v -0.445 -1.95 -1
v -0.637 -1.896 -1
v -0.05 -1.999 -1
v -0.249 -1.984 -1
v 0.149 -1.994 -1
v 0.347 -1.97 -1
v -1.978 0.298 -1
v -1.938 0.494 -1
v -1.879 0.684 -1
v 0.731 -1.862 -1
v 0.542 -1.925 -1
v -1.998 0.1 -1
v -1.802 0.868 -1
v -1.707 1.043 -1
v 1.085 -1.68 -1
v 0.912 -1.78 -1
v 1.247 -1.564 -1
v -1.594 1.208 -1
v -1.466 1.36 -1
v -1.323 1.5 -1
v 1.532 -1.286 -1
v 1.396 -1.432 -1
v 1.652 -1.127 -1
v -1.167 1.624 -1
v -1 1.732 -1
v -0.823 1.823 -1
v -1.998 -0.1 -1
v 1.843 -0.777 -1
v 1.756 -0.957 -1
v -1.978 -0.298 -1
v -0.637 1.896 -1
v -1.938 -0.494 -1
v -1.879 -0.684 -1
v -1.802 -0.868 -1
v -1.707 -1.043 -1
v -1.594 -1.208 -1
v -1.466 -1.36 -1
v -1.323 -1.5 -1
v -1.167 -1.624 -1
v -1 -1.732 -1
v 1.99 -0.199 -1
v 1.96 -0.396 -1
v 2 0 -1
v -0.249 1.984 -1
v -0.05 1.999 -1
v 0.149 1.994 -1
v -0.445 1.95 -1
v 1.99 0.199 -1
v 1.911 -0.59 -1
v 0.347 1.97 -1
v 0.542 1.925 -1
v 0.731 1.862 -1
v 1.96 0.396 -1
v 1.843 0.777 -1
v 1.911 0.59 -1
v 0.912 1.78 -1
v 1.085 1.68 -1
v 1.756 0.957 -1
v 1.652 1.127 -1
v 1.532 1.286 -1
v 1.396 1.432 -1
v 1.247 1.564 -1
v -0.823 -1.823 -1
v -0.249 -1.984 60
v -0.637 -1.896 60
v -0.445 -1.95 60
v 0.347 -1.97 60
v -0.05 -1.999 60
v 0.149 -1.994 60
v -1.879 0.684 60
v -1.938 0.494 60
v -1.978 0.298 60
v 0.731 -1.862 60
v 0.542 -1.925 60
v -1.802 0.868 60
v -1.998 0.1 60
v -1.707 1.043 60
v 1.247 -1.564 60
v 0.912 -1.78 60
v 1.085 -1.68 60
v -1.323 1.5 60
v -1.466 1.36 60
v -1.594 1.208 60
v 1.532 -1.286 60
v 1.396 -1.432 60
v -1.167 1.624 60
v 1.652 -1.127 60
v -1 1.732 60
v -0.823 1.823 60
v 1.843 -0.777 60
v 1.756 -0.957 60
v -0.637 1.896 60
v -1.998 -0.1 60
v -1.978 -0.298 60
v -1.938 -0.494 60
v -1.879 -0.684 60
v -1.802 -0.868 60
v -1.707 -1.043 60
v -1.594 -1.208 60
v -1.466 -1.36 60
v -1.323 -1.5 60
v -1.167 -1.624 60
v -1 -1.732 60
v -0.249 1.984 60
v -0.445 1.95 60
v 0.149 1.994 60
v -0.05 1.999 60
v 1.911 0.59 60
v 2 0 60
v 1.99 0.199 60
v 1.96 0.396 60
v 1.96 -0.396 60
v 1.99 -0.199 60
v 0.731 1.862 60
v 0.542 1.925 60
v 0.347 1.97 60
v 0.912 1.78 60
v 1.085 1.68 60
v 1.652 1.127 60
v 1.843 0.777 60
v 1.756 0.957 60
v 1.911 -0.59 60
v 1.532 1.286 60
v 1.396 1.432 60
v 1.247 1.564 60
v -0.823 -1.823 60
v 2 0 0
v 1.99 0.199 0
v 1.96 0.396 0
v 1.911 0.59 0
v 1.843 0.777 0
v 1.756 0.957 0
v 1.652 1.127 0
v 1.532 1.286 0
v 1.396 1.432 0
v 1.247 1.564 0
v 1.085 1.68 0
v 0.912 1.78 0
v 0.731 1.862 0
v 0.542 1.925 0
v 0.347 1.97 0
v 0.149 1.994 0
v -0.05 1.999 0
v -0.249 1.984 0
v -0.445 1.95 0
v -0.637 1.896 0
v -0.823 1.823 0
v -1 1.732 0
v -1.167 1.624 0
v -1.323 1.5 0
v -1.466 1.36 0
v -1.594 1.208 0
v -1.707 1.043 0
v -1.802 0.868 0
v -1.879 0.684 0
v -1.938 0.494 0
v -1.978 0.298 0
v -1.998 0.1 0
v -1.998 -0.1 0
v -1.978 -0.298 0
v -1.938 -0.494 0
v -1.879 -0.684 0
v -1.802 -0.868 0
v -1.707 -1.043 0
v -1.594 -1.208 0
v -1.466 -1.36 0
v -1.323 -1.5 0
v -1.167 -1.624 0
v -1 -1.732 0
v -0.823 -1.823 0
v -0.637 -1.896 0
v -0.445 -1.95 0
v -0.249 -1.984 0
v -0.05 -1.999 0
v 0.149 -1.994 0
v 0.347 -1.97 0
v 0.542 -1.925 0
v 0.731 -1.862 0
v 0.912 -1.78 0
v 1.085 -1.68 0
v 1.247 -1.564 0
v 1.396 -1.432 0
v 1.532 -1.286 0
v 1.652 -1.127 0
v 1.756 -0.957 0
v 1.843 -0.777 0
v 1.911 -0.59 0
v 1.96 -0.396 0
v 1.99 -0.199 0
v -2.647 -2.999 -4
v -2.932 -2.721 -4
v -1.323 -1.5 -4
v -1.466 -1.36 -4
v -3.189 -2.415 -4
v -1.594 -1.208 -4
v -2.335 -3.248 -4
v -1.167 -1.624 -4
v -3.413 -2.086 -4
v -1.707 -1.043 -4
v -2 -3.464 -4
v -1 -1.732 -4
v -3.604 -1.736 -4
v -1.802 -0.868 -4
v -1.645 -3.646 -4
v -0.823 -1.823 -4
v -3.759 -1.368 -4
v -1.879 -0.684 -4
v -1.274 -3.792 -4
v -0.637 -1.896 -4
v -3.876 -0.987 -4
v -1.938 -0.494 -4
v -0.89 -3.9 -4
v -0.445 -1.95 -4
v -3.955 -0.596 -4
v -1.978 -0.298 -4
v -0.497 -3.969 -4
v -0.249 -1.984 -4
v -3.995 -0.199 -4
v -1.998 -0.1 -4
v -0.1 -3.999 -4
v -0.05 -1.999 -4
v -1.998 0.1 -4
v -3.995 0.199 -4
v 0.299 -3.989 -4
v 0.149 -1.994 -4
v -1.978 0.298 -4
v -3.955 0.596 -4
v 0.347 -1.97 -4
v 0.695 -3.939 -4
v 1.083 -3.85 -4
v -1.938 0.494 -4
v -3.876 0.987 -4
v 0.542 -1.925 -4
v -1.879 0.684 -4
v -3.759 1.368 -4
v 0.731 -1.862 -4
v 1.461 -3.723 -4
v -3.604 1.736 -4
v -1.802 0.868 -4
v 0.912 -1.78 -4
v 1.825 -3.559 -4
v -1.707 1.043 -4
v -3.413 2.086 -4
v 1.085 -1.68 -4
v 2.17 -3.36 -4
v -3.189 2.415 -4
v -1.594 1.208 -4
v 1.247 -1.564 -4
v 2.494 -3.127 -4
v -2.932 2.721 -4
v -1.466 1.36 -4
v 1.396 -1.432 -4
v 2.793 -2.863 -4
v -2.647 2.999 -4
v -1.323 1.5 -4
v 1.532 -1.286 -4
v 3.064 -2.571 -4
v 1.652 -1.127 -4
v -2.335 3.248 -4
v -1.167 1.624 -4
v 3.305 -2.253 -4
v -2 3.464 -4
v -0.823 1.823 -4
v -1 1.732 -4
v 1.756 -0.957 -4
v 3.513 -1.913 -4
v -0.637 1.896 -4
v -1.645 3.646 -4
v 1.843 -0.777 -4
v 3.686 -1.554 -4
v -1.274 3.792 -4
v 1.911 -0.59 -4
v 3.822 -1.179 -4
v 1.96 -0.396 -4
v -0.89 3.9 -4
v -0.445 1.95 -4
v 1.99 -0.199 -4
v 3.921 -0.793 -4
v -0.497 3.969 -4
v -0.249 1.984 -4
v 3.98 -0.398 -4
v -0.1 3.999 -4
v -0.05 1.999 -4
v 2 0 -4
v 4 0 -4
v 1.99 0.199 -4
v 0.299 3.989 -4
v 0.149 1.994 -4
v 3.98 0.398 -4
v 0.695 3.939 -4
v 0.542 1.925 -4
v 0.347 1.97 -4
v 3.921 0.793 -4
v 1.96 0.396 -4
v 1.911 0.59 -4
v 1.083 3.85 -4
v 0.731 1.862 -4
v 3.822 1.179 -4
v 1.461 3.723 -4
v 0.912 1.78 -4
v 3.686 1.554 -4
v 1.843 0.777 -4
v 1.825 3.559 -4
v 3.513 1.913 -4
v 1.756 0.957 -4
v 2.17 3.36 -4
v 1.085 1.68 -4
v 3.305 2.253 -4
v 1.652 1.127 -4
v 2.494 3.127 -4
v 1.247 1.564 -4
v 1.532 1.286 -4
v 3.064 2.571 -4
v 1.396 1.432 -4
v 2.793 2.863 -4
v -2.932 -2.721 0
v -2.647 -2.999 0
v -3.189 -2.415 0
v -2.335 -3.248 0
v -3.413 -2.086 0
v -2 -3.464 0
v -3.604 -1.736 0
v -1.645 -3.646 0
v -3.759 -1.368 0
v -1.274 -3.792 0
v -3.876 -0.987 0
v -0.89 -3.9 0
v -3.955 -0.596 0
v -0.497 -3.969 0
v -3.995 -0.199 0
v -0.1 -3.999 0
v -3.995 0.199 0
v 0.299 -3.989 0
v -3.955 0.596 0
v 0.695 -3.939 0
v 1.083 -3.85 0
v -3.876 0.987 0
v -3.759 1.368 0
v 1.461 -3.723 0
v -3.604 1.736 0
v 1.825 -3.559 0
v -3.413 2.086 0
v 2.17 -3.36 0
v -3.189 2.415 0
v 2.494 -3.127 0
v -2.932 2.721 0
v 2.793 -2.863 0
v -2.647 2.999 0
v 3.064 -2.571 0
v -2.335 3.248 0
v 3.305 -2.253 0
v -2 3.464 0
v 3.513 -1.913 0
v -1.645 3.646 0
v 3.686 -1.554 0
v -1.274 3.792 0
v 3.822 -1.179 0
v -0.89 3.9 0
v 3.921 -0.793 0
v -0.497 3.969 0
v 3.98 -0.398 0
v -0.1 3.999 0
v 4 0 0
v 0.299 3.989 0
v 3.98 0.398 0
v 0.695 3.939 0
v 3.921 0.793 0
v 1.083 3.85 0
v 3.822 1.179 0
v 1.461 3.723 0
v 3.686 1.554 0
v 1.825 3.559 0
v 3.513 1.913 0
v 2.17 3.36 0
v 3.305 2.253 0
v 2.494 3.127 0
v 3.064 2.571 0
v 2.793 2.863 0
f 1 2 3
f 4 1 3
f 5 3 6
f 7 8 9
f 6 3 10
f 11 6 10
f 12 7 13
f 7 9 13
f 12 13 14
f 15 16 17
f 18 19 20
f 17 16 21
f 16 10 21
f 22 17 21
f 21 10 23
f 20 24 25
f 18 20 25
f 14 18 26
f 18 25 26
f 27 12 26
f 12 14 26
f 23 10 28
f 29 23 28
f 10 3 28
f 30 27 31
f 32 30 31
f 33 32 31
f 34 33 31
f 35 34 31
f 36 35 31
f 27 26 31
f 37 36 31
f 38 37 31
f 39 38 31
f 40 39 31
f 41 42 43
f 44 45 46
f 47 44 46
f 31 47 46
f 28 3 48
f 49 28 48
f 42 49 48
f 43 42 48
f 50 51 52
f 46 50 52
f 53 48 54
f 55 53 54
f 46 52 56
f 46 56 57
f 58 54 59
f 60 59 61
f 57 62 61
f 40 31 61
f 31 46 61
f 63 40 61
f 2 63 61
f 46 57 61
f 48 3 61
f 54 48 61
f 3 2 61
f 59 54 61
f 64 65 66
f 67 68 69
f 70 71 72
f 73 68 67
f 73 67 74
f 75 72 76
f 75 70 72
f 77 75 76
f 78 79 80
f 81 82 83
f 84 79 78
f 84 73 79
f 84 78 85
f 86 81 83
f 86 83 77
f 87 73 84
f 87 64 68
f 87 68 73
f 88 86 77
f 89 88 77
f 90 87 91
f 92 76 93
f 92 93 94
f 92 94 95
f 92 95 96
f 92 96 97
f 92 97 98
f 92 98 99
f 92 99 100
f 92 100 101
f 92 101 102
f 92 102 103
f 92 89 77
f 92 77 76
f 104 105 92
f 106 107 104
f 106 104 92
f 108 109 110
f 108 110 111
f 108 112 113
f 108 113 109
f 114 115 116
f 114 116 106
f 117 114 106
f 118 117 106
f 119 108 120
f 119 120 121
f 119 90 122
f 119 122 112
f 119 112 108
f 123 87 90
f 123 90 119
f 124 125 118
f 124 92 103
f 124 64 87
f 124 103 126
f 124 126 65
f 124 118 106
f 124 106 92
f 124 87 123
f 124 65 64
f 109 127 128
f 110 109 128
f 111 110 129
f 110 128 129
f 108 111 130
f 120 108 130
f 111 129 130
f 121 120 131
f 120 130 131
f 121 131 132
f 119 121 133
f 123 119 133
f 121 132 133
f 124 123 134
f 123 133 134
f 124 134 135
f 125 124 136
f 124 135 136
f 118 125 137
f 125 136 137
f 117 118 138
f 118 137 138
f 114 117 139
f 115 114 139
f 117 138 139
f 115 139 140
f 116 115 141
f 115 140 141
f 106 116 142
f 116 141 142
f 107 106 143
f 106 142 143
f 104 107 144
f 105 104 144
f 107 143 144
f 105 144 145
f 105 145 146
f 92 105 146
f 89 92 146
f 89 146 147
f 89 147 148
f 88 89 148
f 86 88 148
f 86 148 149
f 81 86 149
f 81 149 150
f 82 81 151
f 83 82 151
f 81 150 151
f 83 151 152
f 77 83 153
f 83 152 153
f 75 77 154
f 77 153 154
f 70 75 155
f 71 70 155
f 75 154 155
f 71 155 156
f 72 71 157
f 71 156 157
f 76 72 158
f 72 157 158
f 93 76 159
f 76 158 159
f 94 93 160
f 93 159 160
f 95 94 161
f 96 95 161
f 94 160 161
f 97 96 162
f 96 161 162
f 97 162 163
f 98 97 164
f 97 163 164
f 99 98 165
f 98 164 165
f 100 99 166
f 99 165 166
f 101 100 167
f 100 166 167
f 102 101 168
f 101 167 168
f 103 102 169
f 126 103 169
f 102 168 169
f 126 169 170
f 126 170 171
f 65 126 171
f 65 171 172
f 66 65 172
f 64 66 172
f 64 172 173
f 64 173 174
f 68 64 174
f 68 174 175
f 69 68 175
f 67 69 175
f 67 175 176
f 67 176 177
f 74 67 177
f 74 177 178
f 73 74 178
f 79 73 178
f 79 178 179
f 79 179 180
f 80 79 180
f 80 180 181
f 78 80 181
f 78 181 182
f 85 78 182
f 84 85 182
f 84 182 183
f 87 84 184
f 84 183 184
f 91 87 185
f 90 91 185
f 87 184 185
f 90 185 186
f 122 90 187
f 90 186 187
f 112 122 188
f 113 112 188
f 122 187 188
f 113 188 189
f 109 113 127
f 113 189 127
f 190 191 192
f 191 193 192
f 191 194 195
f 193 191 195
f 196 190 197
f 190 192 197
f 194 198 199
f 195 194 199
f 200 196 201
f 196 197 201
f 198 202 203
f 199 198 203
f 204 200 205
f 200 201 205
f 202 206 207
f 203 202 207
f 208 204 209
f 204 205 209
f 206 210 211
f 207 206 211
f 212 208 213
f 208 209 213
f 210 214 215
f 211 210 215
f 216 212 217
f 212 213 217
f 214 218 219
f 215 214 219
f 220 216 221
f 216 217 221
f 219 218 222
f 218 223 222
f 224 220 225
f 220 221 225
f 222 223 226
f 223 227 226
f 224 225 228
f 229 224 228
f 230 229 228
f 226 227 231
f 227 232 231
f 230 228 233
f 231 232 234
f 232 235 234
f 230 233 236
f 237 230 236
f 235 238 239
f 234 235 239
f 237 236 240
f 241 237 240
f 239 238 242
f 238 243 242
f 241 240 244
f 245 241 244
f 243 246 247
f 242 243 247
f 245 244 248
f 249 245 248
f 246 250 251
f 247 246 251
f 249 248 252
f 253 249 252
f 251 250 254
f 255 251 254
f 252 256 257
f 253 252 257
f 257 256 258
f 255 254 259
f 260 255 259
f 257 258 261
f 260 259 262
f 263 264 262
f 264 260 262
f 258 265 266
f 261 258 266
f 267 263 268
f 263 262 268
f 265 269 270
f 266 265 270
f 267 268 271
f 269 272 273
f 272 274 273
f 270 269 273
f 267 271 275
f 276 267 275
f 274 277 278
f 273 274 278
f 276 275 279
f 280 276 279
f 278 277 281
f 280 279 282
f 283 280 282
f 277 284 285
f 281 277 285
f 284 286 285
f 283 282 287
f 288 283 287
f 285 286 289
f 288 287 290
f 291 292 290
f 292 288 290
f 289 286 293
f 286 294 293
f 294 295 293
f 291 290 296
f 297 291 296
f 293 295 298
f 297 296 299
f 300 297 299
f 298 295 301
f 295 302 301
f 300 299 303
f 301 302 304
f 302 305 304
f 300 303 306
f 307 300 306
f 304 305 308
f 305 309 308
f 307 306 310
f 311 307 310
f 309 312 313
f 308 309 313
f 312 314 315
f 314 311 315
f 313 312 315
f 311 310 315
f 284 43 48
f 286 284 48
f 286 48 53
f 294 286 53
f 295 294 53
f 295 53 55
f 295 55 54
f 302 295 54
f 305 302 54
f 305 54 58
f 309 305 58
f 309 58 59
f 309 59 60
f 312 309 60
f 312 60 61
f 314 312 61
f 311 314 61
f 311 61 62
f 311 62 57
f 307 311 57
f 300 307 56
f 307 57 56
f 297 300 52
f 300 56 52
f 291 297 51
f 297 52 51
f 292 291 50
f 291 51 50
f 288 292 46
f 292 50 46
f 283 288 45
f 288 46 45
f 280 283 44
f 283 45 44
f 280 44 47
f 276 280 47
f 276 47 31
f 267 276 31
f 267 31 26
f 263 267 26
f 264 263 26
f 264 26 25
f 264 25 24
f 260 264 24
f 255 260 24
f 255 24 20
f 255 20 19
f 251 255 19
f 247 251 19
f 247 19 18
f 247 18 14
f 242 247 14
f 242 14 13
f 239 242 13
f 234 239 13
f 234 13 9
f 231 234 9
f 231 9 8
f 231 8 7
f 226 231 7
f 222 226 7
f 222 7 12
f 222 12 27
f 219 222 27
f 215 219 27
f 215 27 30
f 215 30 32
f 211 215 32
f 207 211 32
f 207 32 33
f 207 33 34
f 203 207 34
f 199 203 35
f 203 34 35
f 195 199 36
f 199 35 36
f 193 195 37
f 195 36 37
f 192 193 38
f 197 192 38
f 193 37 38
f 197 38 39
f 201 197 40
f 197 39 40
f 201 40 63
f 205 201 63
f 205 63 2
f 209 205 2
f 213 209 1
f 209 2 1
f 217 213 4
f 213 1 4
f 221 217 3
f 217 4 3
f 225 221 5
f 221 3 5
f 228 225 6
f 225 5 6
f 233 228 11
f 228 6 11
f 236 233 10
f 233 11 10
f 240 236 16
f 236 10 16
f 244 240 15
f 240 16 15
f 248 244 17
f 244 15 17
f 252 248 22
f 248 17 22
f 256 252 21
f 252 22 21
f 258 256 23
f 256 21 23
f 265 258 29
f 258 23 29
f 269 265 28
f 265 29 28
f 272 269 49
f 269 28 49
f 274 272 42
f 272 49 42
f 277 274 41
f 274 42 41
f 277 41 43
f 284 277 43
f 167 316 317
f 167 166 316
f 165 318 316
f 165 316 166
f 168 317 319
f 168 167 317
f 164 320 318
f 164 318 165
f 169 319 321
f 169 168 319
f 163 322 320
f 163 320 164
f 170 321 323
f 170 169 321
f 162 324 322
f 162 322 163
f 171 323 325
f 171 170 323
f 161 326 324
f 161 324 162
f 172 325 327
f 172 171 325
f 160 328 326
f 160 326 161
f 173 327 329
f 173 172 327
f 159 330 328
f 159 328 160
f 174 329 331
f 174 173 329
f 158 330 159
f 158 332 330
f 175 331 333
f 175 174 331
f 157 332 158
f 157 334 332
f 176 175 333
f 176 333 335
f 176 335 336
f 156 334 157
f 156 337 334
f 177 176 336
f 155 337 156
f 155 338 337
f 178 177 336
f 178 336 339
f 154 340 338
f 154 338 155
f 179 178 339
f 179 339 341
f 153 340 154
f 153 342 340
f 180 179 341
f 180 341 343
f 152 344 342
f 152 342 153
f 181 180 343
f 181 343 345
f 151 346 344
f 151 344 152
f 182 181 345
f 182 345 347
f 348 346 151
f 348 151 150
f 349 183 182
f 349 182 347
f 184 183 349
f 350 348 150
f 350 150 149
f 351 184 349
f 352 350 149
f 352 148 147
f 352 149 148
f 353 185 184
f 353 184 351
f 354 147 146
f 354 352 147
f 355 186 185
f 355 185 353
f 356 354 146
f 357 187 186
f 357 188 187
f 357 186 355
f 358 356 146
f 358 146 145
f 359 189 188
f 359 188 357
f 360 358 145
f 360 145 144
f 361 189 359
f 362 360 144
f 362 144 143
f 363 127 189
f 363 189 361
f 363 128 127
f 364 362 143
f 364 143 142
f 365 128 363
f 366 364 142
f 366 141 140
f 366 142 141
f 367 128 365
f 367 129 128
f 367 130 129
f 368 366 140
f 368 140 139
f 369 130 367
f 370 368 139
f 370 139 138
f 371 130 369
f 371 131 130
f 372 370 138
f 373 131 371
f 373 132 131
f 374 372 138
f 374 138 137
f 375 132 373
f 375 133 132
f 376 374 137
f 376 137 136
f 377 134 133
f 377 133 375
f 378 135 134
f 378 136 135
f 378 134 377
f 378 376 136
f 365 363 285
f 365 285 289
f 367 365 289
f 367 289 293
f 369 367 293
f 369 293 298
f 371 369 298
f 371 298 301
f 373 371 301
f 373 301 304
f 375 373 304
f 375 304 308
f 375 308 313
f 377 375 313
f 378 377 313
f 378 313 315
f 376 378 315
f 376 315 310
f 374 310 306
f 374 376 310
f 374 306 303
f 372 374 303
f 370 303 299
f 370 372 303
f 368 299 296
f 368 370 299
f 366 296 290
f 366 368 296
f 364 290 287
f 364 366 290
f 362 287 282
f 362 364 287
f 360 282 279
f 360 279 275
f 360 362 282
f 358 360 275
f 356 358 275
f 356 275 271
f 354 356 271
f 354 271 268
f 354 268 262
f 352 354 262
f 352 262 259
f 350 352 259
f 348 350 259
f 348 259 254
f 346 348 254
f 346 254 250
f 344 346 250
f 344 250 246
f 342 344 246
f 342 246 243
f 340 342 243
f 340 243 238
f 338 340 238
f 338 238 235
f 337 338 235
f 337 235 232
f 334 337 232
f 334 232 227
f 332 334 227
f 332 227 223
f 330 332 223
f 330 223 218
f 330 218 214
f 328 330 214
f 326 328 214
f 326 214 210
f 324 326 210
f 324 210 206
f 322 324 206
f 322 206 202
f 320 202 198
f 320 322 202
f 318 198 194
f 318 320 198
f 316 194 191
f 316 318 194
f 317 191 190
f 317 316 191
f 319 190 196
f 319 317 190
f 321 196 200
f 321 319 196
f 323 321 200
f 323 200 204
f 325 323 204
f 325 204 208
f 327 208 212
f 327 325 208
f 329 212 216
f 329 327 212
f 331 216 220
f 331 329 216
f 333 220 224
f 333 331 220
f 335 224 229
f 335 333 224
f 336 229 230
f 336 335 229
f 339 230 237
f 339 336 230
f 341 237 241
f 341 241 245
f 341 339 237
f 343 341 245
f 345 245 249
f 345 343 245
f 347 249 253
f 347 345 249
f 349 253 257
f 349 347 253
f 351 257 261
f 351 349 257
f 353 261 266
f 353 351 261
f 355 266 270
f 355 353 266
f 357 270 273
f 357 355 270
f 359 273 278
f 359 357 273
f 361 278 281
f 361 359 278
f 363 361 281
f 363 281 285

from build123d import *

# Parameters (mm, degrees)
F0_R     = 4
F0_R_2   = 2
F1_DEPTH = 4
F2_DEPTH = 60
F3_DEPTH = 1


with BuildPart() as f1:
    # F0 (on Top) → F1 (new body)
    with BuildSketch(Plane.XY):
        Circle(F0_R)
        Circle(F0_R_2, mode=Mode.SUBTRACT)
    extrude(amount=-F1_DEPTH)

    # F0 (on Top) → F2 (join)
    with BuildSketch(Plane.XY):
        Circle(F0_R_2)
    extrude(amount=F2_DEPTH)

    # F0 (on Top) → F3 (join)
    with BuildSketch(Plane.XY):
        Circle(F0_R)
        Circle(F0_R_2, mode=Mode.SUBTRACT)
        Circle(F0_R_2)
    extrude(amount=-F3_DEPTH)


solid = f1.part
